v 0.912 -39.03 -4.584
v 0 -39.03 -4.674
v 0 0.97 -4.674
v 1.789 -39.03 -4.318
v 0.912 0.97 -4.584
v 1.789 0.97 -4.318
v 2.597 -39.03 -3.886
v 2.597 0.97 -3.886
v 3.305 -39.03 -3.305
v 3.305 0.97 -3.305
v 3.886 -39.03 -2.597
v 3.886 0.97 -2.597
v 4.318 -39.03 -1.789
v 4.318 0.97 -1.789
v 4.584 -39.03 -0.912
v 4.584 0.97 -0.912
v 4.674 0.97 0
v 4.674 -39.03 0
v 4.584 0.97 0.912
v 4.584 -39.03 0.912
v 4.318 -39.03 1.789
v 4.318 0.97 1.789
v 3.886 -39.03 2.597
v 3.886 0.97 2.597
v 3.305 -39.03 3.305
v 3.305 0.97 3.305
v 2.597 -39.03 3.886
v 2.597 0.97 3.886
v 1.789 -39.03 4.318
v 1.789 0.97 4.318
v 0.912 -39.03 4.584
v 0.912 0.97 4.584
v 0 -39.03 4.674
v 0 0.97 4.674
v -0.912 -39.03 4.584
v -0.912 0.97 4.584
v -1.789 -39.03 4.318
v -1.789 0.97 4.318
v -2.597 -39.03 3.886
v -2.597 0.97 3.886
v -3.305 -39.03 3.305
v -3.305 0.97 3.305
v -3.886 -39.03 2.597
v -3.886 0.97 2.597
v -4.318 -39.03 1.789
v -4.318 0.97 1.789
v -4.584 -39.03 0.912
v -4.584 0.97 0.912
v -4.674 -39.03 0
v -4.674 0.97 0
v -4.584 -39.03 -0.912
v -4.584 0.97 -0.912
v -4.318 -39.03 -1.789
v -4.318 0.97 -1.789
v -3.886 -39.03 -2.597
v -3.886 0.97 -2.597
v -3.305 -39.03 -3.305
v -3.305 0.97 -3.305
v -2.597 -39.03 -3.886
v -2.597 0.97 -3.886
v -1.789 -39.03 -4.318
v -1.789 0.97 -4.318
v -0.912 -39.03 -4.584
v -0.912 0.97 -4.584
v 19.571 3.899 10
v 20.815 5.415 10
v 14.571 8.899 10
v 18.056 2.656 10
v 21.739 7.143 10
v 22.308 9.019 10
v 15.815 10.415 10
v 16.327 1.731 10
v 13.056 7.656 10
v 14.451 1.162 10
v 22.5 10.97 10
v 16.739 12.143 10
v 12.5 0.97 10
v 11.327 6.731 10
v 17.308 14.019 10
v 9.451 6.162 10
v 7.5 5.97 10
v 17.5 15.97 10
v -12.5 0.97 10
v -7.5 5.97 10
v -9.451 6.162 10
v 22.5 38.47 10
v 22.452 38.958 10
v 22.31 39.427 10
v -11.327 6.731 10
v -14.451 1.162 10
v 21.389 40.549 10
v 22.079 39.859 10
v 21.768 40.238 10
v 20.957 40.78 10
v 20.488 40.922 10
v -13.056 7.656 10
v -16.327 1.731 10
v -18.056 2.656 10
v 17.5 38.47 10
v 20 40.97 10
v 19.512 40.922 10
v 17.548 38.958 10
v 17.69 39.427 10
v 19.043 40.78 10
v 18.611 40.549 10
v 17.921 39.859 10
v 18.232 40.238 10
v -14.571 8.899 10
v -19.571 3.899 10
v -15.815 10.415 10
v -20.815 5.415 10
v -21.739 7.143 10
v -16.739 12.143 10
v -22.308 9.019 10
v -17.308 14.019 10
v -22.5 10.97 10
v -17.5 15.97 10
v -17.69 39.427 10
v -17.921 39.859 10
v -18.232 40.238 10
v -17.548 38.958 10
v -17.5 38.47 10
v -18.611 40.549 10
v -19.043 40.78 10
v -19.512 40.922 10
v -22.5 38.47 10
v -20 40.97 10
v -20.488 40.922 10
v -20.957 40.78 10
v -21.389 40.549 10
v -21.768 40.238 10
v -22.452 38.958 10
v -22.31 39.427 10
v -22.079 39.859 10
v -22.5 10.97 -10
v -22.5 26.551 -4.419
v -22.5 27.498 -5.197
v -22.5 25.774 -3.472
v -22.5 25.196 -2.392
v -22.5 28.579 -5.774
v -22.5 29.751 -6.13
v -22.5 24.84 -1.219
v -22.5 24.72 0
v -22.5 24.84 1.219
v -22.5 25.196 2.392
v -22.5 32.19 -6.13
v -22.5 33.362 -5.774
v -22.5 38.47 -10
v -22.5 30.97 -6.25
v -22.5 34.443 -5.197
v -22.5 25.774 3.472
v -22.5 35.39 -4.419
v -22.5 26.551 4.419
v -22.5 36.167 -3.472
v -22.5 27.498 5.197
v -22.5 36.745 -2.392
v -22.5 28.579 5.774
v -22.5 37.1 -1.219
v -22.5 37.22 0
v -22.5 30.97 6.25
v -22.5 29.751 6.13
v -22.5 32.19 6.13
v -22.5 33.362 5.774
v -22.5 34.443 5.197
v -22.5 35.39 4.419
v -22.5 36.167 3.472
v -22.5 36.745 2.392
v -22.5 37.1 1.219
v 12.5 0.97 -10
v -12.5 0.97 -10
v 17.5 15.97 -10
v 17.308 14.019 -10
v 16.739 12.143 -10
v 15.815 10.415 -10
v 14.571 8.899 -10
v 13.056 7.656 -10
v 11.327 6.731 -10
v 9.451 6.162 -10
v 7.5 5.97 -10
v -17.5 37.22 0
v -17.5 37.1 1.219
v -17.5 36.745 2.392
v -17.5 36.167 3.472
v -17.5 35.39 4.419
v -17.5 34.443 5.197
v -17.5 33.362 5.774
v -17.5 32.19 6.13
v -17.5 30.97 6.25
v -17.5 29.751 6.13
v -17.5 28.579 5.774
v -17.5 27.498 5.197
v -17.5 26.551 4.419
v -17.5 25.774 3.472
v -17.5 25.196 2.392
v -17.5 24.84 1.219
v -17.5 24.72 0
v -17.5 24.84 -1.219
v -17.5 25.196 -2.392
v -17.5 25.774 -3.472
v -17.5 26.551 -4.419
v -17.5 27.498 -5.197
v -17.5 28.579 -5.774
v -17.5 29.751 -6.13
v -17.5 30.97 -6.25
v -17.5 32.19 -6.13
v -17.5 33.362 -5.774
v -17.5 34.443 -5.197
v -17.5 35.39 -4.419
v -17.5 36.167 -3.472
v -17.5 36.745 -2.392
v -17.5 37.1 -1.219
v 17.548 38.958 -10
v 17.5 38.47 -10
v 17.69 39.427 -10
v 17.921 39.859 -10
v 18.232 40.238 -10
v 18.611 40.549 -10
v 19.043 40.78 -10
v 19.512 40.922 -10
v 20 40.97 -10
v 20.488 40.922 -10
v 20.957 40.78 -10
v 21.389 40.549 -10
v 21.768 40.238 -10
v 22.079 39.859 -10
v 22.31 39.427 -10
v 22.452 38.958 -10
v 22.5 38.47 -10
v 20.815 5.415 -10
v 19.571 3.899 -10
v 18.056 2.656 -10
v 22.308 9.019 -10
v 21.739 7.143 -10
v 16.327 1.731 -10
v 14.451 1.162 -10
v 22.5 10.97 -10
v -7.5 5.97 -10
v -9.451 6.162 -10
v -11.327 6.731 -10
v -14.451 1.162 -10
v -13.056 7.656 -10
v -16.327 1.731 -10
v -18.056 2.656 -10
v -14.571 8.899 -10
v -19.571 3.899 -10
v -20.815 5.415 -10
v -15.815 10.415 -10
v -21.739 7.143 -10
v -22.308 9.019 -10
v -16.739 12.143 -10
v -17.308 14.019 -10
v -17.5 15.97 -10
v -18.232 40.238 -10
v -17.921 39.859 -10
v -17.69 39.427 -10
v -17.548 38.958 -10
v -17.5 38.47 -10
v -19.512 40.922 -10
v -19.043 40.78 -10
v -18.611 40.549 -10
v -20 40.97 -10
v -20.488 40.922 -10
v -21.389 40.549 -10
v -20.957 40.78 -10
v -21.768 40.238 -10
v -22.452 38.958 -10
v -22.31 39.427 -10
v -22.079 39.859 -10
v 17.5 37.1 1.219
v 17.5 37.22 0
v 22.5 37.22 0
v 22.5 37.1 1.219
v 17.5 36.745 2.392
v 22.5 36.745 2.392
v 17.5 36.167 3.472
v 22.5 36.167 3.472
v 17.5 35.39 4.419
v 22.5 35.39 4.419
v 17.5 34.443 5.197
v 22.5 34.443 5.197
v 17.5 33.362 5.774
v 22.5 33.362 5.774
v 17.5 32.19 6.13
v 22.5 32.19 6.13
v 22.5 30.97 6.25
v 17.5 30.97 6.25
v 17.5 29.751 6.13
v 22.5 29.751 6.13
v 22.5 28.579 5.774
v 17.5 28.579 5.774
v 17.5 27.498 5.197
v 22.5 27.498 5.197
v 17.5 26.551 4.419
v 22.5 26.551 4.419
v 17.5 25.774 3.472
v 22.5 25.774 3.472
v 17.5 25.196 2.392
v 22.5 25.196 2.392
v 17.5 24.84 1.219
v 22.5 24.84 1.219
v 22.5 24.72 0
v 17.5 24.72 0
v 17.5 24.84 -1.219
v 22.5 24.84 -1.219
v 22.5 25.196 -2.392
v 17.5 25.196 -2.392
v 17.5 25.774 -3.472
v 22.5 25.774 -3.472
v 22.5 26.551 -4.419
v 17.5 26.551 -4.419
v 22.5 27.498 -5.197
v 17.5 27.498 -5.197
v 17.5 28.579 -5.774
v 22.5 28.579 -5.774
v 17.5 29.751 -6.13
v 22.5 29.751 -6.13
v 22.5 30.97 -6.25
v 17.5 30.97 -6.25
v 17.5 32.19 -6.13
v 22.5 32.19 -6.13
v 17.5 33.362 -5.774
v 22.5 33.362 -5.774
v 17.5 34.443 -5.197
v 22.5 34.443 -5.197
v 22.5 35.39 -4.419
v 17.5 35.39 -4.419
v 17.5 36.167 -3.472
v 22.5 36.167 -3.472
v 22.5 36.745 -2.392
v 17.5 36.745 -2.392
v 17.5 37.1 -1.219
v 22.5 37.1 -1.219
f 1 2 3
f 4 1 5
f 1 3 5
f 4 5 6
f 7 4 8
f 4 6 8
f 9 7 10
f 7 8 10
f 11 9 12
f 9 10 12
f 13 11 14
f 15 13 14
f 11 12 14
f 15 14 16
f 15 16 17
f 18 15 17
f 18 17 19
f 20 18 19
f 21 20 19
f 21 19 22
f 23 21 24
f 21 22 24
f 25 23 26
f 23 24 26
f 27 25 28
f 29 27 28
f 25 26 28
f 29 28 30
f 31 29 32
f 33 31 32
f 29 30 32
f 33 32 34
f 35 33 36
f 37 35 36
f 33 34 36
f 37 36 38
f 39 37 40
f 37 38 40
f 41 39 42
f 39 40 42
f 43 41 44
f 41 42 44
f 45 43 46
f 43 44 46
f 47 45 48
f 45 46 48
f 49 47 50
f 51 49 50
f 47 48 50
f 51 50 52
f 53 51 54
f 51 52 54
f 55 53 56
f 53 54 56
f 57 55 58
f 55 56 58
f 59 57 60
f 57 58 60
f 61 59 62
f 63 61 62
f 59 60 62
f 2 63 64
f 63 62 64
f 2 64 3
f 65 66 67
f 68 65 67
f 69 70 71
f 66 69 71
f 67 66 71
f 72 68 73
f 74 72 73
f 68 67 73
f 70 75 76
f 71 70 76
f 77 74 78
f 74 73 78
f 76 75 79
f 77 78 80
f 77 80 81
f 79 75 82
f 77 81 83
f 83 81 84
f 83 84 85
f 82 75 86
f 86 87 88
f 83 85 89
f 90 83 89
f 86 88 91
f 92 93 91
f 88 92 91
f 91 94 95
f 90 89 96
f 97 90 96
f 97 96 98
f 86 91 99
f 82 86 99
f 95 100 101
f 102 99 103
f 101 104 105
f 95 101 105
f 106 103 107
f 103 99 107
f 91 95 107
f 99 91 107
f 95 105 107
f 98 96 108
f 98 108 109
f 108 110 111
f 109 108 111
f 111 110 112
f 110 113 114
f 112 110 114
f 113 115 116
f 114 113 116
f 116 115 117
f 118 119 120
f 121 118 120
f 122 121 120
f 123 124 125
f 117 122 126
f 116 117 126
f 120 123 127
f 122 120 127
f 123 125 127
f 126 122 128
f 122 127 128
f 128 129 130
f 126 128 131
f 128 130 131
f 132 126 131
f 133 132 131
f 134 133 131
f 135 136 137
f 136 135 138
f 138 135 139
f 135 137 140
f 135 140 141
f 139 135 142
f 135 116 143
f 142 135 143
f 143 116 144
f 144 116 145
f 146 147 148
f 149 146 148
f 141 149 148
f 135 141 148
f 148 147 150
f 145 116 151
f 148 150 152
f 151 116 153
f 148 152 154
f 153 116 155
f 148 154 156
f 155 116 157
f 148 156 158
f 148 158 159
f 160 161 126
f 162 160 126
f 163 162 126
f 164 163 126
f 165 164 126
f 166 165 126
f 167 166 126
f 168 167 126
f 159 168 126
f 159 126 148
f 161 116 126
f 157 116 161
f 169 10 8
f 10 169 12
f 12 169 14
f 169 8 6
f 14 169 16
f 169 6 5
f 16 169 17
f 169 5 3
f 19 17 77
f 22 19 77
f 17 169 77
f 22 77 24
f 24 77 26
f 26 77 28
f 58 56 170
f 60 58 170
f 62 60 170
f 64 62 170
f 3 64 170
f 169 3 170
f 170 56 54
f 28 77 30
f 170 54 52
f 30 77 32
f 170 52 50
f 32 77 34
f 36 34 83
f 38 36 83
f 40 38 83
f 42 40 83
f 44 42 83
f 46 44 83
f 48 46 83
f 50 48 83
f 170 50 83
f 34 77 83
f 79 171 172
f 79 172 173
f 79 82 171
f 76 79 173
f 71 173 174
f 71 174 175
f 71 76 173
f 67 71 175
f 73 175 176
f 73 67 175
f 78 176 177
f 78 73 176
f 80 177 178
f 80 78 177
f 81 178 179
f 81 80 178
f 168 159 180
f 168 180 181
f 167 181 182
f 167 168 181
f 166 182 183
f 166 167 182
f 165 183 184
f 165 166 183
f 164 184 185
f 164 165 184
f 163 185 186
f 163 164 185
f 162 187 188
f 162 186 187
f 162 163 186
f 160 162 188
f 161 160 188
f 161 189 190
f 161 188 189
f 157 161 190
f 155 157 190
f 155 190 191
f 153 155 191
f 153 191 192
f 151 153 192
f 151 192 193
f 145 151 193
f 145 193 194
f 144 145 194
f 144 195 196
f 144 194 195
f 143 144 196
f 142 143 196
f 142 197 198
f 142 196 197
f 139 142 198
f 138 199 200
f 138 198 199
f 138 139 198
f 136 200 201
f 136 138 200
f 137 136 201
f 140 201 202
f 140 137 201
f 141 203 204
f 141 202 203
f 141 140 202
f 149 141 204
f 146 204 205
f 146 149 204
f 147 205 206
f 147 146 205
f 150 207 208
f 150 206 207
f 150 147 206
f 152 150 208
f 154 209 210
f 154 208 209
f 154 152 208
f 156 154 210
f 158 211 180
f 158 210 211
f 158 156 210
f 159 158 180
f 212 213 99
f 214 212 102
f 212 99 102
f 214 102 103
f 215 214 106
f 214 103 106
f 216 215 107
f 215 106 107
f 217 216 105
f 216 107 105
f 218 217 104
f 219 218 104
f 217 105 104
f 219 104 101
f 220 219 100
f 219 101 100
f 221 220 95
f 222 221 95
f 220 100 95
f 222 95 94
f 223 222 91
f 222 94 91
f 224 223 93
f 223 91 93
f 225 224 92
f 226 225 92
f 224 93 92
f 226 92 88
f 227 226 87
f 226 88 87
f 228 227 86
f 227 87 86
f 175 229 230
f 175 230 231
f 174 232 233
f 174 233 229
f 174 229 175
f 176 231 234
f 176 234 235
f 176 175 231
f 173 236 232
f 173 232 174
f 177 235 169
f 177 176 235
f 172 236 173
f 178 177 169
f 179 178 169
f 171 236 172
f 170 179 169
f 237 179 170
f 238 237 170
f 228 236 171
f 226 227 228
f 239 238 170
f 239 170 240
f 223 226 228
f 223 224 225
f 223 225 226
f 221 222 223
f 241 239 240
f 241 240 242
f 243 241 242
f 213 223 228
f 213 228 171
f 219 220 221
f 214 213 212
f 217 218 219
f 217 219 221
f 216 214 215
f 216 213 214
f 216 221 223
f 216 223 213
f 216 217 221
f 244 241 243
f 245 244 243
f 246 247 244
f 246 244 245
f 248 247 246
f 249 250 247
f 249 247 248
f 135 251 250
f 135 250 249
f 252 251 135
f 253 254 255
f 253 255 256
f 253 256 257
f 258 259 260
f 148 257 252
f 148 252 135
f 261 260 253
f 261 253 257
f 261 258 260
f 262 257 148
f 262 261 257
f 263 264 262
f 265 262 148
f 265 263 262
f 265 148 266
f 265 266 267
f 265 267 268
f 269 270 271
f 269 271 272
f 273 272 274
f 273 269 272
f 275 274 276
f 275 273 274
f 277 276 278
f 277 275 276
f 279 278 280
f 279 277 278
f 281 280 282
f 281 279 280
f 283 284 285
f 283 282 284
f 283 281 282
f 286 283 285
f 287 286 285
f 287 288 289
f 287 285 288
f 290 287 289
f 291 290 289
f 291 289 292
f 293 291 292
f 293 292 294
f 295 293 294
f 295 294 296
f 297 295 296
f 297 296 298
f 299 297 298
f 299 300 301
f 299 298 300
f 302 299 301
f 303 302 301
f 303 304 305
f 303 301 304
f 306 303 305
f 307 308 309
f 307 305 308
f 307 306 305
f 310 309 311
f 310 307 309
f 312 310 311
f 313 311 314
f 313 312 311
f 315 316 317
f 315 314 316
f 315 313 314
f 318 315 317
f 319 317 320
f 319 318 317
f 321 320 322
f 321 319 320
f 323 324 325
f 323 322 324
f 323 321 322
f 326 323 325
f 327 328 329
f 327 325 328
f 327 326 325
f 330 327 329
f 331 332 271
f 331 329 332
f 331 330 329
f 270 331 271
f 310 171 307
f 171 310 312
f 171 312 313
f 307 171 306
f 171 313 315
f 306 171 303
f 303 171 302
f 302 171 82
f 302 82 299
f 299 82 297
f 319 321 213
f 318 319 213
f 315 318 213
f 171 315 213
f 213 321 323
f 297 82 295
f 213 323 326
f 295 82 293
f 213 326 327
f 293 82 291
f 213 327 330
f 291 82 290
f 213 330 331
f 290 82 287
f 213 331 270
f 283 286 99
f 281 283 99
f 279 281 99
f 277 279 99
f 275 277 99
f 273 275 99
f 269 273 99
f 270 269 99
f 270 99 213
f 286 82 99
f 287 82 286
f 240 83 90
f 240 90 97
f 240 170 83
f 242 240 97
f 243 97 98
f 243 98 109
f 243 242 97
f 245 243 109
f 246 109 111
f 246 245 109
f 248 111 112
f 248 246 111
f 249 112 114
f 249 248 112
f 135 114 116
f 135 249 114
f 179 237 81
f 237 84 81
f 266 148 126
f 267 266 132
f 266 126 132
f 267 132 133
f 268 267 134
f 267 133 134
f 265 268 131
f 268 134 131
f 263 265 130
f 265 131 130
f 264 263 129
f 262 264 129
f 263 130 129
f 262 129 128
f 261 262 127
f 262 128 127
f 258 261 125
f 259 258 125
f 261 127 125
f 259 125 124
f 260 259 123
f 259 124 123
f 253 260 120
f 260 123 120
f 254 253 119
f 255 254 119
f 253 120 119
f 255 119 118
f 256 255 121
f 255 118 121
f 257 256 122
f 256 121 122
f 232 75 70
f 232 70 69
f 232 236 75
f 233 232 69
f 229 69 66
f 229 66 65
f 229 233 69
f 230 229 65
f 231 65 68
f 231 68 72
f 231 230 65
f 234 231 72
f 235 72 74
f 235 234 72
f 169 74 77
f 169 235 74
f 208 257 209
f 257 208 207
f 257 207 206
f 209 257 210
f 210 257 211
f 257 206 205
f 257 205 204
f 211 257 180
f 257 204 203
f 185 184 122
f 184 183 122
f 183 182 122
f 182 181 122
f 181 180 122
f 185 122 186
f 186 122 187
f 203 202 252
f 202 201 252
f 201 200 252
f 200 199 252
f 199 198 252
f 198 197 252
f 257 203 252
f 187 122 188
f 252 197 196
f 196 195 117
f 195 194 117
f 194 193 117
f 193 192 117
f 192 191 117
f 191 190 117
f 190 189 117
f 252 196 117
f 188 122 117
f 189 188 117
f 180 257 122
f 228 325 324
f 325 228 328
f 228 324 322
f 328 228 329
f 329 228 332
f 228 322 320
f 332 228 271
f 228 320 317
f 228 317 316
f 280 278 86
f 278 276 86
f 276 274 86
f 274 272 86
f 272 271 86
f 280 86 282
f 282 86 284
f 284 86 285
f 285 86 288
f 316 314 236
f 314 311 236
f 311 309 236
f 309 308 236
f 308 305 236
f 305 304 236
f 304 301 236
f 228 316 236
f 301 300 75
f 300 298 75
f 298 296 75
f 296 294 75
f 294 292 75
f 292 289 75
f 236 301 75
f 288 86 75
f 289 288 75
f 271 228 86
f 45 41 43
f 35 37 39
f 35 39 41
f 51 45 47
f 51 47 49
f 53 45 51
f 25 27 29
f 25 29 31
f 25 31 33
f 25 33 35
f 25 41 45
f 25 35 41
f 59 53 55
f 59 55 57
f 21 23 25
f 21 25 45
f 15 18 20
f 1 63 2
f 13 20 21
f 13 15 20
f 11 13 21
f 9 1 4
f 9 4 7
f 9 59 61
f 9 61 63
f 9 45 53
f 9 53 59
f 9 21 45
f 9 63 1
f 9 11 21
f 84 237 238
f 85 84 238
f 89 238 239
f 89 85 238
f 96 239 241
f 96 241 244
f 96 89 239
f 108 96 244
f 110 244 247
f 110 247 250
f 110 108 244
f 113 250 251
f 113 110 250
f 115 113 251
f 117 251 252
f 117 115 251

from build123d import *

# Parameters (mm, degrees)
BOSS_EXTRUDE1_DEPTH     = 20
SKETCH2_R               = 9.3485
BOSS_EXTRUDE2_DEPTH     = 80
FILLET1_R               = 20
CUT_EXTRUDE1_DEPTH      = 126.39936204
CUT_EXTRUDE1_DEPTH_BACK = 126.39936204
SKETCH3_R               = 12.5
SCALE1_SCALE            = 0.5


with BuildPart() as part:
    # Sketch1 → Boss-Extrude1 (new, symmetric)
    with BuildSketch(Plane.XY):
        with BuildLine():
            Line((35, 5), (35, 70))
            ThreePointArc((35, 70), (40, 75), (45, 70))
            Line((45, 70), (45, -5))
            Line((45, -5), (-45, -5))
            Line((-45, -5), (-45, 70))
            ThreePointArc((-45, 70), (-40, 75), (-35, 70))
            Line((-35, 70), (-35, 5))
            Line((-35, 5), (35, 5))
        make_face()
    extrude(amount=BOSS_EXTRUDE1_DEPTH, both=True)

    # Sketch2 → Boss-Extrude2 (add)
    with BuildSketch(Plane.XZ.offset(5)):
        with Locations(Location((0, 0, 0), (0, 0, 270))):
            Circle(SKETCH2_R)
    extrude(amount=BOSS_EXTRUDE2_DEPTH)

    # Fillet1
    fillet1_edges = [part.edges().sort_by_distance(p)[0] for p in [
        (35, 5, 0),
        (45, -5, 0),
        (-45, -5, 0),
        (-35, 5, 0),
    ]]
    fillet(fillet1_edges, radius=FILLET1_R)

    # Sketch3 → Cut-Extrude1 (cut, two sides: drawn at the far end of the back side and taken through both)
    with BuildSketch(Plane(origin=(45, 0, 0), x_dir=(0, 0, -1), z_dir=(1, 0, 0)).offset(-CUT_EXTRUDE1_DEPTH_BACK)):
        with Locations(Location((0, 55, 0), (0, 0, 90))):
            Circle(SKETCH3_R)
    extrude(amount=CUT_EXTRUDE1_DEPTH + CUT_EXTRUDE1_DEPTH_BACK, mode=Mode.SUBTRACT)


with BuildPart() as part_1:
    # Scale1: scaled about (0, 6.940558609, 0)
    add(part.part.scale(SCALE1_SCALE).moved(Location((0, 3.470279304, 0))))


solid = part_1.part
